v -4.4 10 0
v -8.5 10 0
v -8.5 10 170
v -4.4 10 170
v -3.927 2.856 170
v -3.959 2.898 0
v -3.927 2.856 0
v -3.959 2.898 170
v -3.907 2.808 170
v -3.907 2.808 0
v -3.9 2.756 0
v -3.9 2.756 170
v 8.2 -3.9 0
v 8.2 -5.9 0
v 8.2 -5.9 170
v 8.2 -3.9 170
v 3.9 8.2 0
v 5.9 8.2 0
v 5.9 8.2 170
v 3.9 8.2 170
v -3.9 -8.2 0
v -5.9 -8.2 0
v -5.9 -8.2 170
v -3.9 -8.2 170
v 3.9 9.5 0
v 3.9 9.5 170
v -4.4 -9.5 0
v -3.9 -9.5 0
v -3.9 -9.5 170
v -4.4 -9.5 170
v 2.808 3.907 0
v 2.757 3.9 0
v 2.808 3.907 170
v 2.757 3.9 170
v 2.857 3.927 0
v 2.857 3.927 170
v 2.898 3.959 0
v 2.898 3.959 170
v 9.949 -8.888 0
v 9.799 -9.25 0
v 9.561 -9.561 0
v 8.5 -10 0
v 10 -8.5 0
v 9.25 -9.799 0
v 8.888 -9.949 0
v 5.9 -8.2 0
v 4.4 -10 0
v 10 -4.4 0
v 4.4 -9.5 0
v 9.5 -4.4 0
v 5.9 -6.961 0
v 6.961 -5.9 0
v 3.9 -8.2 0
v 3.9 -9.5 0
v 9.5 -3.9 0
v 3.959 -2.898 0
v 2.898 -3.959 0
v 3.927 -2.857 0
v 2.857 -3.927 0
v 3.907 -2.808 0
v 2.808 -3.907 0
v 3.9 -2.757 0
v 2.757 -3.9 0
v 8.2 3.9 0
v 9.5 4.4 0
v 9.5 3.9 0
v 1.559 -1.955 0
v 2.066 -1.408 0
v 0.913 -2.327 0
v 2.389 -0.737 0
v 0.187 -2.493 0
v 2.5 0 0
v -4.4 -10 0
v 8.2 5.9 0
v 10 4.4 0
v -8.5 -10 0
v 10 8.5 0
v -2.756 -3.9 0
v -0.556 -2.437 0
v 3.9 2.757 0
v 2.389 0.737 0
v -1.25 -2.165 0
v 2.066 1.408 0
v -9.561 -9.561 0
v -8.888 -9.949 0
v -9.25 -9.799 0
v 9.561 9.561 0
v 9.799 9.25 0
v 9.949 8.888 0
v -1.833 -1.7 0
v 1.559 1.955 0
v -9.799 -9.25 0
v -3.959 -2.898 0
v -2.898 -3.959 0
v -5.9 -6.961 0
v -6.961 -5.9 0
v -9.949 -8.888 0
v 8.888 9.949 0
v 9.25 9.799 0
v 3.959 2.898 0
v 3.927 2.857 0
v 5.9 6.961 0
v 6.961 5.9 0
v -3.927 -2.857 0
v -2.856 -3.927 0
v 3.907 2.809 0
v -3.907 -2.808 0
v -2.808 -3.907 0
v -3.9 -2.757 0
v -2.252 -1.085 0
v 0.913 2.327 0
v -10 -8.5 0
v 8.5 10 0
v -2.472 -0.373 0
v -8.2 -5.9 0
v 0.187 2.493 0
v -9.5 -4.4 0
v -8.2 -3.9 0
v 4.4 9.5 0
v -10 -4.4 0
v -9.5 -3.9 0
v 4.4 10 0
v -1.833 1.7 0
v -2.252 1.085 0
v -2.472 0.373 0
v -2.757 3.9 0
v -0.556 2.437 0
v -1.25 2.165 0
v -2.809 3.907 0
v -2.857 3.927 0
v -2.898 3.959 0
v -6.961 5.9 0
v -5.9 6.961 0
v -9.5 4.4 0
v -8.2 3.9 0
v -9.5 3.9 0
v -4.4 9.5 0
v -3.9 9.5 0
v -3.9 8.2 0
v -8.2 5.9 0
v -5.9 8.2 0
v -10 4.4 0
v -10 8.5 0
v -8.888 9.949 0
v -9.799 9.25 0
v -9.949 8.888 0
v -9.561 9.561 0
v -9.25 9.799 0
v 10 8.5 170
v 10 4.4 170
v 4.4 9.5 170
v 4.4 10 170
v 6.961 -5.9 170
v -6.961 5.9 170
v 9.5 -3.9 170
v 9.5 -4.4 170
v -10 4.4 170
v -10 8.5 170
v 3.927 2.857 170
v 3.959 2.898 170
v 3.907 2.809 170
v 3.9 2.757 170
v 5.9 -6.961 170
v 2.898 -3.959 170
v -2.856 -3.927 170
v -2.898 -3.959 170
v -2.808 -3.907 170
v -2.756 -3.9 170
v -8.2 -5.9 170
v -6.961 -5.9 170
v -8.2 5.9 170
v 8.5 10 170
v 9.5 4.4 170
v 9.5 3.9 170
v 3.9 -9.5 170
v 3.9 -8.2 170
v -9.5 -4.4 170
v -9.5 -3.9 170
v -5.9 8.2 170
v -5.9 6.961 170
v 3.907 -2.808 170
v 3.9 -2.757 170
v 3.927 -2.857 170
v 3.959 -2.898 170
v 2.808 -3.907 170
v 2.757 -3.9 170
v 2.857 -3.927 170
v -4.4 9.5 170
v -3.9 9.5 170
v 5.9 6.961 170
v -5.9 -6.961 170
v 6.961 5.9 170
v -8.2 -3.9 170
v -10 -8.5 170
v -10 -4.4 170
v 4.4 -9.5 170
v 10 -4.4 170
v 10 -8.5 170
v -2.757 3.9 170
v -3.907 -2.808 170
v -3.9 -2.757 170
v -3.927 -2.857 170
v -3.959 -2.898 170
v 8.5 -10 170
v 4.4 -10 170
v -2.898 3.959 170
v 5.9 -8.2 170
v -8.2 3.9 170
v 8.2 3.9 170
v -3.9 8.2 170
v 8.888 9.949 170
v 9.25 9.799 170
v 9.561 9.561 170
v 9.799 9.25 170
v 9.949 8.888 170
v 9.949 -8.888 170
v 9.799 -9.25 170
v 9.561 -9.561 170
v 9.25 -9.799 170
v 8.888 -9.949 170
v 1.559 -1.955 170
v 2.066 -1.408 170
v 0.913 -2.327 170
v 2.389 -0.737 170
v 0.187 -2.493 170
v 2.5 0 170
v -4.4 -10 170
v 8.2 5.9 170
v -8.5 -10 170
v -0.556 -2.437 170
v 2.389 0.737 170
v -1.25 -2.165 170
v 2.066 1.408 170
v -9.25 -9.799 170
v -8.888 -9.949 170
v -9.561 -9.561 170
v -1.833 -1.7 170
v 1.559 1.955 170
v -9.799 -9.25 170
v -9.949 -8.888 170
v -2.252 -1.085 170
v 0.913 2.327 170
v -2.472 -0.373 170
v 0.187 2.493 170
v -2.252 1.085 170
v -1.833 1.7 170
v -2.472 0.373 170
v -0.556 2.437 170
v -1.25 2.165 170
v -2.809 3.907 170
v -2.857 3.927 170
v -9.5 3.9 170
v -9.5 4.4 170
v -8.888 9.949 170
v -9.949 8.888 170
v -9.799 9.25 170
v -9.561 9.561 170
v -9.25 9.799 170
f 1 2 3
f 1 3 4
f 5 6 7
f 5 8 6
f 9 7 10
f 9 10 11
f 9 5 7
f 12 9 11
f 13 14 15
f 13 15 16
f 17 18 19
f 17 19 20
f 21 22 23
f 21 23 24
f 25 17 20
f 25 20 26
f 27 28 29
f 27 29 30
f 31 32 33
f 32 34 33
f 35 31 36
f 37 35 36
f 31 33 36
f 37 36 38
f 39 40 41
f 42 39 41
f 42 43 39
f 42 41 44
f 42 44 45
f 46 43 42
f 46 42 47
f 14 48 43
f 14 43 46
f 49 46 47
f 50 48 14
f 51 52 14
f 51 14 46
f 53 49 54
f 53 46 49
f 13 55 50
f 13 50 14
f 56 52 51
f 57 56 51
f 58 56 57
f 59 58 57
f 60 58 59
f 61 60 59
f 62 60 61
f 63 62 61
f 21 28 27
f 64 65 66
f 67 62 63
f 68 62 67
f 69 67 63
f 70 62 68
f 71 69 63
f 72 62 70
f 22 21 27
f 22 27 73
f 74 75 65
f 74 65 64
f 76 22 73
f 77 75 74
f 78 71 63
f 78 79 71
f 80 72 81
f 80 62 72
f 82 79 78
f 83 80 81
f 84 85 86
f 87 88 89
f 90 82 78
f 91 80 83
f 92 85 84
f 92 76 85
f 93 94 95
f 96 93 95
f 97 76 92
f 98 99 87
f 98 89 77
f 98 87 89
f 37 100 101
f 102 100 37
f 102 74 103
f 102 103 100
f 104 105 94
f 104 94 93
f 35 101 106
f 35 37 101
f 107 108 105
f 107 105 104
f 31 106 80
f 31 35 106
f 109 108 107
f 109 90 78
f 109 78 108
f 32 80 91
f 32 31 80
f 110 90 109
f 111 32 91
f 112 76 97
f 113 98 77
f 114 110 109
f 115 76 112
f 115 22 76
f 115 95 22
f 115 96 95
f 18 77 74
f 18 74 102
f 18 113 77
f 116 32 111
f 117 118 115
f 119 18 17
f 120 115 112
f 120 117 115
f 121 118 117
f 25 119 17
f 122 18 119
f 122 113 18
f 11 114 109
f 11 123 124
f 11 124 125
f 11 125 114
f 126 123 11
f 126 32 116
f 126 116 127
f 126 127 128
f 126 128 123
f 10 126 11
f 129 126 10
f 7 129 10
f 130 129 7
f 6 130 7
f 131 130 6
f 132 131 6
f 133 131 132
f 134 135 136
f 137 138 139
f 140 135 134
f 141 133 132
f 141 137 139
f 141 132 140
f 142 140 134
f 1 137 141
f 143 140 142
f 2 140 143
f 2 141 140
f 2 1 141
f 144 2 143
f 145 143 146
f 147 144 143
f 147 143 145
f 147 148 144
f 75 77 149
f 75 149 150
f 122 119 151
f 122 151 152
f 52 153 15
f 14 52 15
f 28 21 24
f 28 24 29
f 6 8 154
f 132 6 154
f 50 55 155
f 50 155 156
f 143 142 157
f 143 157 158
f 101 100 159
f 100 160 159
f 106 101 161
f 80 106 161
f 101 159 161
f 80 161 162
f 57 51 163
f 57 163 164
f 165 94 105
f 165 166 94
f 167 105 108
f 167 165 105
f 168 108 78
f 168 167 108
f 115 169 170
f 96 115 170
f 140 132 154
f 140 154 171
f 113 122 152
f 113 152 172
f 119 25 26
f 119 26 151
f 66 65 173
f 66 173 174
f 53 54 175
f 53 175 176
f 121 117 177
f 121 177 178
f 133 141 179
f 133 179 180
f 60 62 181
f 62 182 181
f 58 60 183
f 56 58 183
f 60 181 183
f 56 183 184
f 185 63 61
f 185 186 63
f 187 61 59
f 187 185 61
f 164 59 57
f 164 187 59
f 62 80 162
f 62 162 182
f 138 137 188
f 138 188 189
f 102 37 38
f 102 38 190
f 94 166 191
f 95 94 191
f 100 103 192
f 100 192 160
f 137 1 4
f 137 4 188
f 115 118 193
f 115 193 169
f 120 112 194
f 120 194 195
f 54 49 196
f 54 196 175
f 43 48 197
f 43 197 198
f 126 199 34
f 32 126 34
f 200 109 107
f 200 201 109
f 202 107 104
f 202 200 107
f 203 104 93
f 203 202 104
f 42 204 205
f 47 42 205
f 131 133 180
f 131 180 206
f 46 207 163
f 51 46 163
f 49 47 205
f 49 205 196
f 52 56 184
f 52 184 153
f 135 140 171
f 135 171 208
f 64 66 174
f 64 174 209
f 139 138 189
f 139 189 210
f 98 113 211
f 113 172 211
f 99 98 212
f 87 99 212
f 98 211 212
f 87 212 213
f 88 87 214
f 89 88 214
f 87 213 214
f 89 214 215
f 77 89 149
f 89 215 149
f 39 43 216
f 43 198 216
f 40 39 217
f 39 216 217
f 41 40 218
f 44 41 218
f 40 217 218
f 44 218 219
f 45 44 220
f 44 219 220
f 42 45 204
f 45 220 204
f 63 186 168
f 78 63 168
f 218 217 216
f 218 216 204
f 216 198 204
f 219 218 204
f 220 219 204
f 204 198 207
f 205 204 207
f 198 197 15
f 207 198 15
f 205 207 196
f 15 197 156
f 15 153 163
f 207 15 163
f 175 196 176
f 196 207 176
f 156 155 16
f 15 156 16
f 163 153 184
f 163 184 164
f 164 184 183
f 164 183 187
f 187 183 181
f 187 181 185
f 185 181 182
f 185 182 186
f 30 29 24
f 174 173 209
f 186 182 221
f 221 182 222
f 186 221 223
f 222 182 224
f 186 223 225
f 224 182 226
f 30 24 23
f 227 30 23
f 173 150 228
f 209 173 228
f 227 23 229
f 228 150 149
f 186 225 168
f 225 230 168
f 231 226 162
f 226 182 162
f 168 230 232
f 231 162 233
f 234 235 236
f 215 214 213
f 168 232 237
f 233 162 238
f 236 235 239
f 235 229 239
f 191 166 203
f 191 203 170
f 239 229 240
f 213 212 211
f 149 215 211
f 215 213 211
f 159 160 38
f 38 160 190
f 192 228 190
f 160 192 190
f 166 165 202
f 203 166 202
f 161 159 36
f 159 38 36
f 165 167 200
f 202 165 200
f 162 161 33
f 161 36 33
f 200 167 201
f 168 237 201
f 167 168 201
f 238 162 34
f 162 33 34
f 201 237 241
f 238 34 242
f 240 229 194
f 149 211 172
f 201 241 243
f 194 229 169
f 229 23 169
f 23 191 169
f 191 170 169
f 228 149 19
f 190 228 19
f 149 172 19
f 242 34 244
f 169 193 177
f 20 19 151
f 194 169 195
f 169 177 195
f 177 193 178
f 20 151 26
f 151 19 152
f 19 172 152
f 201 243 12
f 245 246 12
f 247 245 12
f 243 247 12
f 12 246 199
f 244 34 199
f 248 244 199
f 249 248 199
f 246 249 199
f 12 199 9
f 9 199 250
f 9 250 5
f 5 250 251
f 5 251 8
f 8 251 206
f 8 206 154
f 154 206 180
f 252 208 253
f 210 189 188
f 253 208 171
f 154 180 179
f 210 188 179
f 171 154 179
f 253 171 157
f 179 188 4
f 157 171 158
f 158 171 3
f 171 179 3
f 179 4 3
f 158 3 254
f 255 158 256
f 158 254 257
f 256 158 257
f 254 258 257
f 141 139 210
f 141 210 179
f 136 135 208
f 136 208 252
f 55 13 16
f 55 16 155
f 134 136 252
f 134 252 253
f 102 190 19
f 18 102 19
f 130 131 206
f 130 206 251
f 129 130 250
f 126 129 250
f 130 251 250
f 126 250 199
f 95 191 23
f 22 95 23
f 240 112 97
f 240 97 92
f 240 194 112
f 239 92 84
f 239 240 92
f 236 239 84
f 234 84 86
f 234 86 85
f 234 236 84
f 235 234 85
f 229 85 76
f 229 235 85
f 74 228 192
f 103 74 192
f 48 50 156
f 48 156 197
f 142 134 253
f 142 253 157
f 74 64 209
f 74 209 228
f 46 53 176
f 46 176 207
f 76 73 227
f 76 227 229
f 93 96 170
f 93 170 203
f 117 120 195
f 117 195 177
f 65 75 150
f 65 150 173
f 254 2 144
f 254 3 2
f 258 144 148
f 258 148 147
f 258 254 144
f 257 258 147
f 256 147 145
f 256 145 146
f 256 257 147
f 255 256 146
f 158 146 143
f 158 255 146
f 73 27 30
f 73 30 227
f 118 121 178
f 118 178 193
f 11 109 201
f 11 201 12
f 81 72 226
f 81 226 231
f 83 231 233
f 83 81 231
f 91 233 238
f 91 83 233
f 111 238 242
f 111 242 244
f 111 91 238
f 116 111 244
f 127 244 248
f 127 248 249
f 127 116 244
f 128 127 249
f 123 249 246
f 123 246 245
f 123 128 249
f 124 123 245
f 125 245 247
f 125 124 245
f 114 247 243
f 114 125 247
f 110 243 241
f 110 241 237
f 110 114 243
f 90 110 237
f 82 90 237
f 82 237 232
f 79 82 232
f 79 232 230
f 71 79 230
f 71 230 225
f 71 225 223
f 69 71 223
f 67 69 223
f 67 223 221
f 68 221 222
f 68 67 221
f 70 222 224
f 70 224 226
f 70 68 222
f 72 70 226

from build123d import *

# Parameters (mm, degrees)
SKETCH_1_R      = 2.5
EXTRUDE_1_DEPTH = 170
FILLET_1_R      = 1.5
FILLET_2_R      = 0.2


with BuildPart() as part:
    # 草图1 → 凸台-拉伸1 (new body)
    with BuildSketch(Plane.XY):
        Polygon((-9.999999566, 9.999999566), (-4.399999566, 9.999999566), (-4.399999566, 9.499999566), (-3.899999566, 9.499999566), (-3.899999566, 8.199999566), (-5.899999566, 8.199999566), (-5.899999566, 6.960659737), (-2.839609534, 3.900132646), (2.839471605, 3.900132646), (5.900000434, 6.960661475), (5.900000434, 8.200001303), (3.900000434, 8.200001303), (3.900000434, 9.500001303), (4.400000434, 9.500001303), (4.400000434, 10.000001303), (10.000000434, 10.000001303), (10.000000434, 4.400001303), (9.500000434, 4.400001303), (9.500000434, 3.900001303), (8.200000434, 3.900001303), (8.200000434, 5.900001303), (6.960660606, 5.900001303), (3.900133515, 2.839611272), (3.900133515, -2.839469868), (6.960662344, -5.899998697), (8.200002172, -5.899998697), (8.200002172, -3.899998697), (9.500002172, -3.899998697), (9.500002172, -4.399998697), (10.000002172, -4.399998697), (10.000000434, -10.000000434), (4.400002172, -9.999998697), (4.400002172, -9.499998697), (3.900002172, -9.499998697), (3.900002172, -8.199998697), (5.900002172, -8.199998697), (5.900002172, -6.960658869), (2.839475081, -3.899994711), (-2.839331933, -3.899994711), (-5.899997828, -6.960660606), (-5.899997828, -8.200000434), (-3.899997828, -8.200000434), (-3.899997828, -9.500000434), (-4.399997828, -9.500000434), (-4.399997828, -10.000000434), (-9.999999566, -10.000000434), (-9.999997828, -4.400000434), (-9.499997828, -4.400000434), (-9.499997828, -3.900000434), (-8.199997828, -3.900000434), (-8.199997828, -5.900000434), (-6.960658, -5.900000434), (-3.899993842, -2.839473343), (-3.899993842, 2.83933367), (-6.960659737, 5.899999566), (-8.199999566, 5.899999566), (-8.199999566, 3.899999566), (-9.499999566, 3.899999566), (-9.499999566, 4.399999566), (-9.999999566, 4.399999566), align=None)
        Circle(SKETCH_1_R, mode=Mode.SUBTRACT)
    extrude(amount=EXTRUDE_1_DEPTH)

    # 圆角1
    fillet_1_edges = [part.edges().sort_by_distance(p)[0] for p in [
        (10.000000434, 10.000001303, 85),
        (10.000000434, -10.000000434, 85),
        (-9.999999566, -10.000000434, 85),
        (-9.999999566, 9.999999566, 85),
    ]]
    fillet(fillet_1_edges, radius=FILLET_1_R)

    # 圆角2
    fillet_2_edges = [part.edges().sort_by_distance(p)[0] for p in [
        (3.900133515, 2.839611272, 85),
        (3.900133515, -2.839469868, 85),
        (2.839475081, -3.899994711, 85),
        (-2.839331933, -3.899994711, 85),
        (-3.899993842, -2.839473343, 85),
        (-3.899993842, 2.83933367, 85),
        (-2.839609534, 3.900132646, 85),
        (2.839471605, 3.900132646, 85),
    ]]
    fillet(fillet_2_edges, radius=FILLET_2_R)


solid = part.part
